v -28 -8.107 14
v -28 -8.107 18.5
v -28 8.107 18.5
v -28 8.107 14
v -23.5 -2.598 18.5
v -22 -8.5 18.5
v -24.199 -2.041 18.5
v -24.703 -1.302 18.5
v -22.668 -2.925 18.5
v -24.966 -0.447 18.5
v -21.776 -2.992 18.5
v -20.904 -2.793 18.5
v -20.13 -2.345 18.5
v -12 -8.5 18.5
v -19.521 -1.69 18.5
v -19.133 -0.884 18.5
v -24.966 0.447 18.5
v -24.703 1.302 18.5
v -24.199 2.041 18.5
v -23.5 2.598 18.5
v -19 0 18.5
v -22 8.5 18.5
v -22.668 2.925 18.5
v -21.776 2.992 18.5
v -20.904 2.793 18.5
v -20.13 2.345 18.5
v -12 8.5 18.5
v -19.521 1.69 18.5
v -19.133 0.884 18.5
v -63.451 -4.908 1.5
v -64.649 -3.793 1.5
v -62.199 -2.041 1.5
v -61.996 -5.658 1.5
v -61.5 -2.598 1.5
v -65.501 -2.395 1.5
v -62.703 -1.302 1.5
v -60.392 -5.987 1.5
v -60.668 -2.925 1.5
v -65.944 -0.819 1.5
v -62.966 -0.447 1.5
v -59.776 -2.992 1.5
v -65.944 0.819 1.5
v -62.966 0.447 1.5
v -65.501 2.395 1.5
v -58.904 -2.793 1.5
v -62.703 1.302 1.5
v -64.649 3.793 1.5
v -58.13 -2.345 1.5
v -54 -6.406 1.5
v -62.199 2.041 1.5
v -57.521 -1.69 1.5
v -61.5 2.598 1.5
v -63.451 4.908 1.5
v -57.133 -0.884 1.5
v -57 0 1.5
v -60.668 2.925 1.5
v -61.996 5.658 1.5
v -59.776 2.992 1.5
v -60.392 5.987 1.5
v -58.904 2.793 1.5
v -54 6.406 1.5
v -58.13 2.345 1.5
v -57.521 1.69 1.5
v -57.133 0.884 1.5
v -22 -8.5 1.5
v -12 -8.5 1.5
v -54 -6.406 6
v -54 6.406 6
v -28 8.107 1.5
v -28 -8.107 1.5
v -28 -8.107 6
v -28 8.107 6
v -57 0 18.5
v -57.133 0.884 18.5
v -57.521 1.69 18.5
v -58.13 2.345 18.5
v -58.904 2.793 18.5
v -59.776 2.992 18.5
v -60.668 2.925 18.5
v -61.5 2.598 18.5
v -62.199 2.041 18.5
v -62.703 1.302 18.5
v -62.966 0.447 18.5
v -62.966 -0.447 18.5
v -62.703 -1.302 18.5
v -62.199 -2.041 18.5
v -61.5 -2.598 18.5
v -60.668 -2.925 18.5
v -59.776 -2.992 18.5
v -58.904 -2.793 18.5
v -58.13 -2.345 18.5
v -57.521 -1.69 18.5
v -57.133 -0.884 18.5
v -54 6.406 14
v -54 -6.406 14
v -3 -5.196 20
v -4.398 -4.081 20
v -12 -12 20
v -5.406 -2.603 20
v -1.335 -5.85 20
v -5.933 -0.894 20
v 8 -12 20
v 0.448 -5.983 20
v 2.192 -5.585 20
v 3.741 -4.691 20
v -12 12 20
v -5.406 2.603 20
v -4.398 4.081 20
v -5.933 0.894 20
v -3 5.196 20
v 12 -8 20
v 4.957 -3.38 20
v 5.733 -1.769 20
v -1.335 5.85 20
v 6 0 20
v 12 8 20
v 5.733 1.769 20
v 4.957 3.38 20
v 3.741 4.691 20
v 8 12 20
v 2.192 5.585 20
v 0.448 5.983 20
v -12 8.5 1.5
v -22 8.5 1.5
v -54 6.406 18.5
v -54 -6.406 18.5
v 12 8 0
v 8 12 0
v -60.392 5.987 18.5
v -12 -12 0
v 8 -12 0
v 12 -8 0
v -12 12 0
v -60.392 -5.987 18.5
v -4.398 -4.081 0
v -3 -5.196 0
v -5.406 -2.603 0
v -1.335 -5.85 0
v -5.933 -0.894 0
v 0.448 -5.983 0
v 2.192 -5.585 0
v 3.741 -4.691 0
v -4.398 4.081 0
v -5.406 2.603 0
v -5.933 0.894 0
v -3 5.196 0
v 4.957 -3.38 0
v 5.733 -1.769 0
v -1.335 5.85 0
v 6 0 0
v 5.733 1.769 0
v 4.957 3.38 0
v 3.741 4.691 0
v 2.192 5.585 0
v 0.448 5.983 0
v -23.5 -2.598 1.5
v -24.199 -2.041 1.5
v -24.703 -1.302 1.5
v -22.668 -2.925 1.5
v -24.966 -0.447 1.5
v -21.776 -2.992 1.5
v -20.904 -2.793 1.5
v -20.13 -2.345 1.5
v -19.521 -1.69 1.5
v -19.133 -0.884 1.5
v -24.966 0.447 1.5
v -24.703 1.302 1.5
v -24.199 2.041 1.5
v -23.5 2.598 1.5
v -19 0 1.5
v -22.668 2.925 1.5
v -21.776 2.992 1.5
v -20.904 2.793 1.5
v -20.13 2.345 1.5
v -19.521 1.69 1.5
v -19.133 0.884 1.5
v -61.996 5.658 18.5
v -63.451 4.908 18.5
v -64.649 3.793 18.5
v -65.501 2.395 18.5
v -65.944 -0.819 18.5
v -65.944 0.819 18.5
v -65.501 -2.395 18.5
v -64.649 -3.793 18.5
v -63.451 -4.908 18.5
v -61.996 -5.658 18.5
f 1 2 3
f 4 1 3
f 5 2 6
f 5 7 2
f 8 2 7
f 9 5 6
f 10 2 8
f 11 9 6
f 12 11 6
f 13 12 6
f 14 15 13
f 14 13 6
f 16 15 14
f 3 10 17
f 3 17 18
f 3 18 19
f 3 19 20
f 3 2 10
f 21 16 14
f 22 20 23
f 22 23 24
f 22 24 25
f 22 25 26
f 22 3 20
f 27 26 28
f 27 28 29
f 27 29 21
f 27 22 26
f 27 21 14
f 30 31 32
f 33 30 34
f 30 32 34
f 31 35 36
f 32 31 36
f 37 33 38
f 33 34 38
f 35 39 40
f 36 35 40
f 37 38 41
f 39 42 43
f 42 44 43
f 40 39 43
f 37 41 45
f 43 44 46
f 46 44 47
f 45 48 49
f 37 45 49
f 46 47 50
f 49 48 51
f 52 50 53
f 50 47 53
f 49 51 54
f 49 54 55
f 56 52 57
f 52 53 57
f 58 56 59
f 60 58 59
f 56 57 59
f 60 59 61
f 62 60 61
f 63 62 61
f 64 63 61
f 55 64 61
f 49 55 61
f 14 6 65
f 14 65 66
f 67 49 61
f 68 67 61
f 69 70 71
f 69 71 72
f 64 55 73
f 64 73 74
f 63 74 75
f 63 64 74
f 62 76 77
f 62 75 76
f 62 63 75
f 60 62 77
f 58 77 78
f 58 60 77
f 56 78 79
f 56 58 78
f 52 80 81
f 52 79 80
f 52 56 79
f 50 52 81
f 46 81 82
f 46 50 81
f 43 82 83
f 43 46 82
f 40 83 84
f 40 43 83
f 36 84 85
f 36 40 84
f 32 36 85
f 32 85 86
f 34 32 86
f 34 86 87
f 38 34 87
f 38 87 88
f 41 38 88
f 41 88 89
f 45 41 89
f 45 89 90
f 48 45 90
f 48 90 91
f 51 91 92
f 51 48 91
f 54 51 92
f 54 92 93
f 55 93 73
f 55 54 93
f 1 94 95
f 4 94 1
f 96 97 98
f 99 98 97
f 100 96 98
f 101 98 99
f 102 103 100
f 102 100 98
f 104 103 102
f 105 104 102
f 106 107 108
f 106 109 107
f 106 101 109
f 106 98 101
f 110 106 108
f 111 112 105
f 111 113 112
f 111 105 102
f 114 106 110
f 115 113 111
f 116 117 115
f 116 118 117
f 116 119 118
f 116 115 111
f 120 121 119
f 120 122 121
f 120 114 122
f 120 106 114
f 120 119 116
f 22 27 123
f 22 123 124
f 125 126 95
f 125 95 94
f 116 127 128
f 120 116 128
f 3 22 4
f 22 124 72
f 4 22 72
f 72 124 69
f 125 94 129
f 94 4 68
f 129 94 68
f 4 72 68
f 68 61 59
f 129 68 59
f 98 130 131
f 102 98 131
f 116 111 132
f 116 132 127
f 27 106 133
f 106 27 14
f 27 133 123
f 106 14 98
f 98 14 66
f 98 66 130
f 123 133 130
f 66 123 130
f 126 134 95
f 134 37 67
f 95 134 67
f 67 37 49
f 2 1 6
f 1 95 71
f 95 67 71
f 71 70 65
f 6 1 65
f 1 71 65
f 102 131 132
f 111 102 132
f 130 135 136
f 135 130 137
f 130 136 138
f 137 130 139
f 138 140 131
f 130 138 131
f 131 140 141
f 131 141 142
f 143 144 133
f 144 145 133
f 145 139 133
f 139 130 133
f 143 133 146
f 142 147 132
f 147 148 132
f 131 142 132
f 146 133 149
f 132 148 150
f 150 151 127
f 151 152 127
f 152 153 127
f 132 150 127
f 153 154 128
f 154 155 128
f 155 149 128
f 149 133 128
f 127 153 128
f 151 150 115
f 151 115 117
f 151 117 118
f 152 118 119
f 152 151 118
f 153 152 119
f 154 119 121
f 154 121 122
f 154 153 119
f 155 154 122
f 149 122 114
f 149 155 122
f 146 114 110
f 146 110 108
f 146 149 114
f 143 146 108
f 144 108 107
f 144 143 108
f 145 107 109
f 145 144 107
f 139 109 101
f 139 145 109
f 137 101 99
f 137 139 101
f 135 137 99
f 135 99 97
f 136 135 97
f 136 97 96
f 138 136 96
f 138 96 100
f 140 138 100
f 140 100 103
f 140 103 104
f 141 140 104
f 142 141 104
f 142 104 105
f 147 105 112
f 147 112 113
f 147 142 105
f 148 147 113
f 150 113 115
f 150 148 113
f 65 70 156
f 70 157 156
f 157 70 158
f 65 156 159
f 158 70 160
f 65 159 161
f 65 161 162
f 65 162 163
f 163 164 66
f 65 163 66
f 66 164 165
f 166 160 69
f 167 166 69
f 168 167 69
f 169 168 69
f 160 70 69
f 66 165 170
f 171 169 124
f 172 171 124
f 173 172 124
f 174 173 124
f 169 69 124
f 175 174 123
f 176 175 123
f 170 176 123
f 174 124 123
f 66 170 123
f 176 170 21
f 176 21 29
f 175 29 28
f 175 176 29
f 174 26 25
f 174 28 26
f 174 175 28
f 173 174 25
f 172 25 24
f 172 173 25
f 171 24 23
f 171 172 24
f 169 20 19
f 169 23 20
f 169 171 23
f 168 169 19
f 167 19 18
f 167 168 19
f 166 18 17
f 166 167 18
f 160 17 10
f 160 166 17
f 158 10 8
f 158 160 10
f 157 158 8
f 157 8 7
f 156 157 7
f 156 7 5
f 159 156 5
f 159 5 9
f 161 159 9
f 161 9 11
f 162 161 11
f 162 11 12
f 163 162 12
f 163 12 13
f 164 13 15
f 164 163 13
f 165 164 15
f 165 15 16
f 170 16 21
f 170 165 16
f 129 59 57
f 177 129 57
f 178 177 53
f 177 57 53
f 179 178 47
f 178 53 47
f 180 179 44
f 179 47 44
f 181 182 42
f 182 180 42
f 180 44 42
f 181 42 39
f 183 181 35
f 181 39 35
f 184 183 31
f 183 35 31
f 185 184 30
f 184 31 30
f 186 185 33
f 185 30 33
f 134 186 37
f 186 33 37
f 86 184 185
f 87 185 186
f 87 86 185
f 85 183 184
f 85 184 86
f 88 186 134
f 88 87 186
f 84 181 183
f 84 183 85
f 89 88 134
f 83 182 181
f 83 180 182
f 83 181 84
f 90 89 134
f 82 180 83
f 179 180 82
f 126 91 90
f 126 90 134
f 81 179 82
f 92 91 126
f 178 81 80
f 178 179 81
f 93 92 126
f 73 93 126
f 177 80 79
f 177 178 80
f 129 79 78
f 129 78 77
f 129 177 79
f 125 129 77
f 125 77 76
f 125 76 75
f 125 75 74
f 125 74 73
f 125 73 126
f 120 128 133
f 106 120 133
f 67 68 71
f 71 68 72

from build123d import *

# Parameters (mm, degrees)
ESQUISSE1_R             = 6
ESQUISSE1_R_2           = 3
BOSS_EXTRU_1_DEPTH      = 20
ESQUISSE3_W             = 16
ESQUISSE3_H             = 17
ESQUISSE3_W_2           = 24.161002882
ESQUISSE3_H_2           = 23.937604634
ENL_V_MAT_EXTRU_1_DEPTH = 1.5
ESQUISSE4_W             = 26
ESQUISSE4_H             = 16.214580426
ENL_V_MAT_EXTRU_2_DEPTH = 6


with BuildPart() as part:
    # Esquisse1 → Boss.-Extru.1 (new body)
    with BuildSketch(Plane.XY):
        Polygon((8, 12), (-12, 12), (-12, -12), (8, -12), (12, -8), (12, 8), align=None)
        Circle(ESQUISSE1_R, mode=Mode.SUBTRACT)
        with BuildLine():
            Line((-12, 8.5), (-22, 8.5))
            Line((-22, 8.5), (-60.391871312, 5.987189397))
            ThreePointArc((-60.391871312, 5.987189397), (-66, 0), (-60.391871312, -5.987189397))
            Line((-60.391871312, -5.987189397), (-22, -8.5))
            Line((-22, -8.5), (-12, -8.5))
            Line((-12, -8.5), (-12, 8.5))
        make_face()
        with Locations((-22, 0)):
            Circle(ESQUISSE1_R_2, mode=Mode.SUBTRACT)
        with Locations((-60, 0)):
            Circle(ESQUISSE1_R_2, mode=Mode.SUBTRACT)
    extrude(amount=BOSS_EXTRU_1_DEPTH)

    # Esquisse3 → Enlèv. mat.-Extru.1 (cut)
    with BuildSketch(Plane.XY.offset(20)):
        with Locations((-20, 0)):
            Rectangle(ESQUISSE3_W, ESQUISSE3_H)
        with Locations((-66.080501441, -0.730031796)):
            Rectangle(ESQUISSE3_W_2, ESQUISSE3_H_2)
    enl_v_mat_extru_1 = extrude(amount=-ENL_V_MAT_EXTRU_1_DEPTH, mode=Mode.SUBTRACT)

    # Esquisse4 → Enlèv. mat.-Extru.2 (cut)
    with BuildSketch(Plane.XY.offset(20)):
        with Locations((-41, 0)):
            Rectangle(ESQUISSE4_W, ESQUISSE4_H)
    enl_v_mat_extru_2 = extrude(amount=-ENL_V_MAT_EXTRU_2_DEPTH, mode=Mode.SUBTRACT)

    # Symétrie1: Enlèv. mat.-Extru.1, Enlèv. mat.-Extru.2 across plane
    add(enl_v_mat_extru_1.mirror(Plane.XY.offset(10)), mode=Mode.SUBTRACT)
    add(enl_v_mat_extru_2.mirror(Plane.XY.offset(10)), mode=Mode.SUBTRACT)


solid = part.part
